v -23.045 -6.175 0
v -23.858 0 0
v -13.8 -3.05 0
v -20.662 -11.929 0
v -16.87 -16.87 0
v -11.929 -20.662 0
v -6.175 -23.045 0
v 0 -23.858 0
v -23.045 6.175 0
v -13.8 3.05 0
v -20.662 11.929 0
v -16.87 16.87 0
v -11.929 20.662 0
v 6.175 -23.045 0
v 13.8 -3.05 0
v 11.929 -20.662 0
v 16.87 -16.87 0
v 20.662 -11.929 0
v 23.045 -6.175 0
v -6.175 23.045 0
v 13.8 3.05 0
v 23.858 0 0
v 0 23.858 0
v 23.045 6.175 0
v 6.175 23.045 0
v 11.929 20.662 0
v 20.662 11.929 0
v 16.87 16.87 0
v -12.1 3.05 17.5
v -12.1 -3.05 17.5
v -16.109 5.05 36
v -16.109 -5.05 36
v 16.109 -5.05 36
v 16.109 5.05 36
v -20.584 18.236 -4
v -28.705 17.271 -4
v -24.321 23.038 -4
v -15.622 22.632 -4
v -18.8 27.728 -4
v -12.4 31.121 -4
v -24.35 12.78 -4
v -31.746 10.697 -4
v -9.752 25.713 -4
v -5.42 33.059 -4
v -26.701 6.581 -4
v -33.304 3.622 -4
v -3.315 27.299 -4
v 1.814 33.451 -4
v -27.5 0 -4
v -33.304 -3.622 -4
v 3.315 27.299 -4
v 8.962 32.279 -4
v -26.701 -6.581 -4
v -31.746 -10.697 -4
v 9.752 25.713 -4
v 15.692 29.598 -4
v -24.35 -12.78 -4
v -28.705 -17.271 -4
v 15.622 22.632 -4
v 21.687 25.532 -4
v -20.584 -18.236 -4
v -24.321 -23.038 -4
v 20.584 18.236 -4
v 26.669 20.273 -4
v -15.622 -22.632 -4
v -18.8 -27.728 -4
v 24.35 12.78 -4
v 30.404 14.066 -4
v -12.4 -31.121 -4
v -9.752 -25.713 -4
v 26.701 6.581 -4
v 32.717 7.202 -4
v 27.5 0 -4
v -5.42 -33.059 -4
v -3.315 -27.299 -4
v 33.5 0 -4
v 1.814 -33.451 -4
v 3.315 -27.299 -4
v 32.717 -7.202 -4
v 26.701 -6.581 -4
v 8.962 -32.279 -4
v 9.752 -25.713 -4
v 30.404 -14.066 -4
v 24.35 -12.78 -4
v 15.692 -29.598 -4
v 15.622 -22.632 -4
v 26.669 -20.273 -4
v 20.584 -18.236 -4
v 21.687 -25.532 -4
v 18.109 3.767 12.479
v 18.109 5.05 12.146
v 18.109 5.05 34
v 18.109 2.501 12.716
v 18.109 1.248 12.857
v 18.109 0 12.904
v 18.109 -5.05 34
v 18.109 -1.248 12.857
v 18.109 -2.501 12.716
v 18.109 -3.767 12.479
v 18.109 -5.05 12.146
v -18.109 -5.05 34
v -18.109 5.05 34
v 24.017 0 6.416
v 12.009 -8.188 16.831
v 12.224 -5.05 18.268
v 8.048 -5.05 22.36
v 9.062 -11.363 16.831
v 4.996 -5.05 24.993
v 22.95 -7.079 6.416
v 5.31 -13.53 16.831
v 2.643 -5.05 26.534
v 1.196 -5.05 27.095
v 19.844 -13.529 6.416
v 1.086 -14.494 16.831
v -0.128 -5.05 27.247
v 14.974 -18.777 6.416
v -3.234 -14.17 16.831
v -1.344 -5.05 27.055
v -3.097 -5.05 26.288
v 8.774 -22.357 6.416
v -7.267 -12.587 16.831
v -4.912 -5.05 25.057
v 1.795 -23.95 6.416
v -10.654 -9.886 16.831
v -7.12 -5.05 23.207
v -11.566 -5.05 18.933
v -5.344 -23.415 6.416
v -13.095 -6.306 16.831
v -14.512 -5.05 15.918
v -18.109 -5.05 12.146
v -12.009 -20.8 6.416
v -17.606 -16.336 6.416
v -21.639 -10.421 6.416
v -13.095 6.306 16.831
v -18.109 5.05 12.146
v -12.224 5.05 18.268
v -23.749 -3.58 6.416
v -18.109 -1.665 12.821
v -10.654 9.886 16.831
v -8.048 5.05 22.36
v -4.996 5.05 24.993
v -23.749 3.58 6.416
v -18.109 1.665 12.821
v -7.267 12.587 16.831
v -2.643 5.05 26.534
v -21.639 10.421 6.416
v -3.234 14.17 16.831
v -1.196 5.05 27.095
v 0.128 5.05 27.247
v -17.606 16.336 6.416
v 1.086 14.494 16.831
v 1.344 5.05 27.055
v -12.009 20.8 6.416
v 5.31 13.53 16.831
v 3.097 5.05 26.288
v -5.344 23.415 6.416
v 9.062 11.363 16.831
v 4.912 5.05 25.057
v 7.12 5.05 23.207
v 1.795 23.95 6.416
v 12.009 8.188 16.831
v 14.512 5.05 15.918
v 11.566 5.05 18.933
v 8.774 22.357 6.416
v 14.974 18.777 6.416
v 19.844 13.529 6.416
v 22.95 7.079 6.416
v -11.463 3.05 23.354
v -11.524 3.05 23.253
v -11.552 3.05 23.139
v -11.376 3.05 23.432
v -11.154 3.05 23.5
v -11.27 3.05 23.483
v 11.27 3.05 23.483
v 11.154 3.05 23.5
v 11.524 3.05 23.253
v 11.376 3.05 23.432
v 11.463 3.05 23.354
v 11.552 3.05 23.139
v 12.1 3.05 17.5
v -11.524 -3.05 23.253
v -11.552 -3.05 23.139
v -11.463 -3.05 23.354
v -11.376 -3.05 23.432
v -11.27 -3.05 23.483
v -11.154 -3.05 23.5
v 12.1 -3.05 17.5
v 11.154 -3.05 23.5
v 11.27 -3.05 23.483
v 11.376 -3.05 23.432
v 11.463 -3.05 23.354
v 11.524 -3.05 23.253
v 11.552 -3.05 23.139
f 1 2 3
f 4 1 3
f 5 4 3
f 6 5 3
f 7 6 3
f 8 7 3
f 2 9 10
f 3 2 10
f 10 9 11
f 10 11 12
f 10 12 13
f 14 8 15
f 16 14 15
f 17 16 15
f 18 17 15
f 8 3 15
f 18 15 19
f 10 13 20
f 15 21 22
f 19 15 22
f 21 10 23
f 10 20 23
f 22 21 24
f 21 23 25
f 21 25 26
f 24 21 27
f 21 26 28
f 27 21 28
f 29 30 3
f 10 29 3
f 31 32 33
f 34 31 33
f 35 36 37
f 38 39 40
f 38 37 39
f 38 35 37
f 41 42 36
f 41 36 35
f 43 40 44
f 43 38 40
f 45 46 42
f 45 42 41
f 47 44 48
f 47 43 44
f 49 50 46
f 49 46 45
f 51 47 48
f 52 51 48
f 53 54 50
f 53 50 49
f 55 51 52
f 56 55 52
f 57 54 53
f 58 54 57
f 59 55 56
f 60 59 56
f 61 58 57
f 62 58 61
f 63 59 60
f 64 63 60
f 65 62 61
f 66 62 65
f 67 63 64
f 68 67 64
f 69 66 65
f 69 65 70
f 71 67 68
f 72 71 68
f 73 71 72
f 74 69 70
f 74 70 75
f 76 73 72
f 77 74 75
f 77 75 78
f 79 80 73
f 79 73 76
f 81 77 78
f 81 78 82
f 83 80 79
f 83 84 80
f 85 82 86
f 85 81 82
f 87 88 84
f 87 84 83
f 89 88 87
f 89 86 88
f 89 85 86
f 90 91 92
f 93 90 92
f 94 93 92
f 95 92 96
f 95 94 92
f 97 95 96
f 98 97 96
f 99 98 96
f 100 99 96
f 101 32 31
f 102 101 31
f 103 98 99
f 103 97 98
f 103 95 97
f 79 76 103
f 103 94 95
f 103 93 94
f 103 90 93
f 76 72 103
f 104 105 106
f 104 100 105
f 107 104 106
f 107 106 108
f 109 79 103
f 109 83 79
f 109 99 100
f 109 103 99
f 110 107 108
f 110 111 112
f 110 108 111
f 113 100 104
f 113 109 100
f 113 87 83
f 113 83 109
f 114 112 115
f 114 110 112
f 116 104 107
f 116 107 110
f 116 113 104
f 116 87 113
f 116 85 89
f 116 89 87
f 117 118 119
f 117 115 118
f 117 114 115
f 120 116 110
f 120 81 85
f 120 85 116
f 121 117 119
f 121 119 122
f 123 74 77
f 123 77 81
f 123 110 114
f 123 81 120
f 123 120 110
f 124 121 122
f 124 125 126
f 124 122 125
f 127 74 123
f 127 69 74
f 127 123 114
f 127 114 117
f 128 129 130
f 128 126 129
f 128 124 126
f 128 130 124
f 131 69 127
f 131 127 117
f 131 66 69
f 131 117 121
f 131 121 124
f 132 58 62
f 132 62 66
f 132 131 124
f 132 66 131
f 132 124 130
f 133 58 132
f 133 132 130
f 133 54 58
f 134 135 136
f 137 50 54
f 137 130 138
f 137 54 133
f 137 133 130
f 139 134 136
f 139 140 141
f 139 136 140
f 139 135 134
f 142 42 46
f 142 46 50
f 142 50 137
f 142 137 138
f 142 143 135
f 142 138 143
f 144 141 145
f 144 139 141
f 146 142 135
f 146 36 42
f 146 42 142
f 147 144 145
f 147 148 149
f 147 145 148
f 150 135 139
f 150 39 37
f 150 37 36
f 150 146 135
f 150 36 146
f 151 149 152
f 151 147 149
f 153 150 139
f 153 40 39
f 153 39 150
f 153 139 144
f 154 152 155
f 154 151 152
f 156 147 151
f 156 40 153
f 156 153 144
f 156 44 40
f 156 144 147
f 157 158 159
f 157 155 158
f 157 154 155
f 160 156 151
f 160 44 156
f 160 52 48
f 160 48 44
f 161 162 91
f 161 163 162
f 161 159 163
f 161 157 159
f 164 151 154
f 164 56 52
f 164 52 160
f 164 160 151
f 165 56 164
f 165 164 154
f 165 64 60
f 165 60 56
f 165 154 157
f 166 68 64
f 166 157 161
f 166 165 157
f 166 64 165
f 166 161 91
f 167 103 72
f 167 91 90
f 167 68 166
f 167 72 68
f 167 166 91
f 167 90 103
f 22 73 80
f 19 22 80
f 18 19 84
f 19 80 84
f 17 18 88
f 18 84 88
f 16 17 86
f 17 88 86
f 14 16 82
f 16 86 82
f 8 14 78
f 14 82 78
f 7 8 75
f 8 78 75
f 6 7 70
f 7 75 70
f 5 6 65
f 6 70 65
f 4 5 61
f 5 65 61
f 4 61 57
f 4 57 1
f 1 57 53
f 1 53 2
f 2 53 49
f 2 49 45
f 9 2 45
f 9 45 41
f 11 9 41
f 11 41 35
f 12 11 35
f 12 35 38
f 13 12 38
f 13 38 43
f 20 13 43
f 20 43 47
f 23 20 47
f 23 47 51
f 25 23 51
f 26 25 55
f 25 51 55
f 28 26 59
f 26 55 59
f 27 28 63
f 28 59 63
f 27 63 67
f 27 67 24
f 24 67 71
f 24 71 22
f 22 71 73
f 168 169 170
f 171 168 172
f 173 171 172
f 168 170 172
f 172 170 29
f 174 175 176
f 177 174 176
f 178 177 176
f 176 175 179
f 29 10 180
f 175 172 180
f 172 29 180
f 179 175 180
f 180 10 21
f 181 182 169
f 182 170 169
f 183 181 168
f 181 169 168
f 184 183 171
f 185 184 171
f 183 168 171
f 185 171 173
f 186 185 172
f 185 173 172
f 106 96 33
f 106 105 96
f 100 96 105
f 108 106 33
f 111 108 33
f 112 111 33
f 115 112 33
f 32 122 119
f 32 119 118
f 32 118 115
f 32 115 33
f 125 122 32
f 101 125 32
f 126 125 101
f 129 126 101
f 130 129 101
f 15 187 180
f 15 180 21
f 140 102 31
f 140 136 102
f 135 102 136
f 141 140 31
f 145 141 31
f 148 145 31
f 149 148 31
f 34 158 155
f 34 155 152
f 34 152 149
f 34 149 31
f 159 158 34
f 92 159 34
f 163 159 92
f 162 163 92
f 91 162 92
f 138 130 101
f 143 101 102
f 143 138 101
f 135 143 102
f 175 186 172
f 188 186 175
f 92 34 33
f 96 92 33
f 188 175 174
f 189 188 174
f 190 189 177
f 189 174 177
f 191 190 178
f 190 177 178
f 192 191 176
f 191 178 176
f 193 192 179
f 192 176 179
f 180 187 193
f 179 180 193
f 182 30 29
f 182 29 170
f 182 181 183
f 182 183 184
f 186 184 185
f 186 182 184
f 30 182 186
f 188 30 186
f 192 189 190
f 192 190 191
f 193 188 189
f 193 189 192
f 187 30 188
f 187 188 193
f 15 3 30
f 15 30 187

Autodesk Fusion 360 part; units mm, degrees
sketch "Sketch1" plane through (0, 0, 0) normal (0, 1, 0) x (1, 0, 0)
  line L0 (-12.1, -17.5) -> (-13.8, 0)
  line L1 (-12.1, -17.5) -> (-11.5171, -23.5)
  line L2 (-13.8, 0) -> (0, 0)
  line L3 (0, 0) -> (0, -23.5) construction
  line L4 (-12.1, -17.5) -> (0, -17.5) construction
  line L5 (-11.5171, -23.5) -> (0, -23.5)
  line L6 (0, 0) -> (0, -23.5) construction
  line L7 (13.8, 0) -> (0, 0)
  line L8 (12.1, -17.5) -> (13.8, 0)
  line L9 (11.5171, -23.5) -> (0, -23.5)
  line L10 (12.1, -17.5) -> (11.5171, -23.5)
  line L11 (0, -29.5) -> (33.5, 4) construction
  line L12 (33.5, 4) -> (33.5, 7.6922)
  line L13 (0, -29.5) -> (14.1, -29.5)
  line L14 (14.1, -29.5) -> (14.1, -15.4)
  line L15 (0, -29.5) -> (-14.1, -29.5)
  line L16 (-14.1, -29.5) -> (-14.1, -15.4)
  line L17 (14.1, -15.4) -> (-14.1, -15.4)
  line L18 (33.5, 4) -> (28.0093, 4)
  line L19 (28.0093, 4) -> (0, 4)
  line L20 (0, 4) -> (0, -29.5)
  line L21 (3, -29.5) -> (33.5, 4)
  line L22 (13.8, 0) -> (16.1094, 4)
  line L23 (-13.8, 0) -> (-16.1094, 4)
  line L24 (-28.0093, 4) -> (0, 4)
  dimension "d1" = 17.5
  dimension "d4" = 6
  dimension "d7" = 27.6
  dimension "d8" = 24.2
  dimension "d13" = 135
  dimension "d14" = 2
  dimension "d15" = 6
  dimension "d16" = 4
  dimension "d22" = 3
  dimension "d26" = 60
extrude "Extrude1" add sketch "Sketch1" along normal mid plane 6.1 contours L0 L1 L5 L17 L20 | L0 L2 L17 L20 | L2 L20 L23 L24 | L7 L8 L17 L20 | L8 L9 L10 L17 L20 L21 | L7 L19 L20 L22 | L9 L10 L21 makes body 1
fillet "Fillet1" radius 0.4 2 edges at (11.5171, 0, 23.5) (-11.5171, 0, 23.5) on bodies 1
revolve "Revolve1" add sketch "Sketch1" angle 360 about axis through (0, 0, -4) along (0, 0, 1) separate body contours L7 L8 L17 L20 | L8 L9 L10 L17 L20 L21 | L9 L13 L20 L21 | L7 L19 L20 L22 | L8 L10 L14 L17 L21 | L8 L14 L17 L18 L19 L21 L22 makes body 2
sketch "Sketch3" plane through (0, 0, -4) normal (0, 0, -1) x (1, 0, 0)
  circle A0 centre (0, 0) radius 33.5
  line L0 (-16.1094, 3.05) -> (-16.1094, -3.05) construction
  line L1 (-16.1094, -3.05) -> (16.1094, -3.05) construction
  line L2 (16.1094, -3.05) -> (16.1094, 3.05) construction
  line L3 (16.1094, 3.05) -> (-16.1094, 3.05) construction
  line L4 (18.1094, 5.05) -> (-18.1094, 5.05)
  line L5 (-18.1094, 5.05) -> (-18.1094, -5.05)
  line L6 (-18.1094, -5.05) -> (18.1094, -5.05)
  line L7 (18.1094, -5.05) -> (18.1094, 5.05)
  dimension "d27" = 2
extrude "Extrude3" add sketch "Sketch3" against normal blind 40 contours L4 L5 L6 L7 bodies 2
combine "Combine1" operation cut target body 2 tool bodies 1
chamfer "Chamfer1" distance 2 angle 45 2 edges at (18.1094, 0, 36) (-18.1094, 0, 36) on bodies 2
sketch "Sketch4" plane through (0, 0, 0) normal (0, 1, 0) x (1, 0, 0)
  line L0 (18.1094, -12.9044) -> (33.5, 4)
  line L1 (-33.5, 4) -> (-18.1094, -12.9044)
  line L2 (33.5, 4) -> (27.5, 4)
  line L3 (27.5, 4) -> (23.8582, 0)
  line L4 (23.8582, 0) -> (0, 0)
  line L5 (0, 0) -> (0, 4)
  line L6 (0, 4) -> (27.5, 4)
  point P0 (-33.5, 4)
  point P1 (33.5, 4)
  dimension "d29" = 6
revolve "Revolve2" cut sketch "Sketch4" angle 360 about axis through (0, 0, 1.75) along (0, 0, 1) bodies 2
